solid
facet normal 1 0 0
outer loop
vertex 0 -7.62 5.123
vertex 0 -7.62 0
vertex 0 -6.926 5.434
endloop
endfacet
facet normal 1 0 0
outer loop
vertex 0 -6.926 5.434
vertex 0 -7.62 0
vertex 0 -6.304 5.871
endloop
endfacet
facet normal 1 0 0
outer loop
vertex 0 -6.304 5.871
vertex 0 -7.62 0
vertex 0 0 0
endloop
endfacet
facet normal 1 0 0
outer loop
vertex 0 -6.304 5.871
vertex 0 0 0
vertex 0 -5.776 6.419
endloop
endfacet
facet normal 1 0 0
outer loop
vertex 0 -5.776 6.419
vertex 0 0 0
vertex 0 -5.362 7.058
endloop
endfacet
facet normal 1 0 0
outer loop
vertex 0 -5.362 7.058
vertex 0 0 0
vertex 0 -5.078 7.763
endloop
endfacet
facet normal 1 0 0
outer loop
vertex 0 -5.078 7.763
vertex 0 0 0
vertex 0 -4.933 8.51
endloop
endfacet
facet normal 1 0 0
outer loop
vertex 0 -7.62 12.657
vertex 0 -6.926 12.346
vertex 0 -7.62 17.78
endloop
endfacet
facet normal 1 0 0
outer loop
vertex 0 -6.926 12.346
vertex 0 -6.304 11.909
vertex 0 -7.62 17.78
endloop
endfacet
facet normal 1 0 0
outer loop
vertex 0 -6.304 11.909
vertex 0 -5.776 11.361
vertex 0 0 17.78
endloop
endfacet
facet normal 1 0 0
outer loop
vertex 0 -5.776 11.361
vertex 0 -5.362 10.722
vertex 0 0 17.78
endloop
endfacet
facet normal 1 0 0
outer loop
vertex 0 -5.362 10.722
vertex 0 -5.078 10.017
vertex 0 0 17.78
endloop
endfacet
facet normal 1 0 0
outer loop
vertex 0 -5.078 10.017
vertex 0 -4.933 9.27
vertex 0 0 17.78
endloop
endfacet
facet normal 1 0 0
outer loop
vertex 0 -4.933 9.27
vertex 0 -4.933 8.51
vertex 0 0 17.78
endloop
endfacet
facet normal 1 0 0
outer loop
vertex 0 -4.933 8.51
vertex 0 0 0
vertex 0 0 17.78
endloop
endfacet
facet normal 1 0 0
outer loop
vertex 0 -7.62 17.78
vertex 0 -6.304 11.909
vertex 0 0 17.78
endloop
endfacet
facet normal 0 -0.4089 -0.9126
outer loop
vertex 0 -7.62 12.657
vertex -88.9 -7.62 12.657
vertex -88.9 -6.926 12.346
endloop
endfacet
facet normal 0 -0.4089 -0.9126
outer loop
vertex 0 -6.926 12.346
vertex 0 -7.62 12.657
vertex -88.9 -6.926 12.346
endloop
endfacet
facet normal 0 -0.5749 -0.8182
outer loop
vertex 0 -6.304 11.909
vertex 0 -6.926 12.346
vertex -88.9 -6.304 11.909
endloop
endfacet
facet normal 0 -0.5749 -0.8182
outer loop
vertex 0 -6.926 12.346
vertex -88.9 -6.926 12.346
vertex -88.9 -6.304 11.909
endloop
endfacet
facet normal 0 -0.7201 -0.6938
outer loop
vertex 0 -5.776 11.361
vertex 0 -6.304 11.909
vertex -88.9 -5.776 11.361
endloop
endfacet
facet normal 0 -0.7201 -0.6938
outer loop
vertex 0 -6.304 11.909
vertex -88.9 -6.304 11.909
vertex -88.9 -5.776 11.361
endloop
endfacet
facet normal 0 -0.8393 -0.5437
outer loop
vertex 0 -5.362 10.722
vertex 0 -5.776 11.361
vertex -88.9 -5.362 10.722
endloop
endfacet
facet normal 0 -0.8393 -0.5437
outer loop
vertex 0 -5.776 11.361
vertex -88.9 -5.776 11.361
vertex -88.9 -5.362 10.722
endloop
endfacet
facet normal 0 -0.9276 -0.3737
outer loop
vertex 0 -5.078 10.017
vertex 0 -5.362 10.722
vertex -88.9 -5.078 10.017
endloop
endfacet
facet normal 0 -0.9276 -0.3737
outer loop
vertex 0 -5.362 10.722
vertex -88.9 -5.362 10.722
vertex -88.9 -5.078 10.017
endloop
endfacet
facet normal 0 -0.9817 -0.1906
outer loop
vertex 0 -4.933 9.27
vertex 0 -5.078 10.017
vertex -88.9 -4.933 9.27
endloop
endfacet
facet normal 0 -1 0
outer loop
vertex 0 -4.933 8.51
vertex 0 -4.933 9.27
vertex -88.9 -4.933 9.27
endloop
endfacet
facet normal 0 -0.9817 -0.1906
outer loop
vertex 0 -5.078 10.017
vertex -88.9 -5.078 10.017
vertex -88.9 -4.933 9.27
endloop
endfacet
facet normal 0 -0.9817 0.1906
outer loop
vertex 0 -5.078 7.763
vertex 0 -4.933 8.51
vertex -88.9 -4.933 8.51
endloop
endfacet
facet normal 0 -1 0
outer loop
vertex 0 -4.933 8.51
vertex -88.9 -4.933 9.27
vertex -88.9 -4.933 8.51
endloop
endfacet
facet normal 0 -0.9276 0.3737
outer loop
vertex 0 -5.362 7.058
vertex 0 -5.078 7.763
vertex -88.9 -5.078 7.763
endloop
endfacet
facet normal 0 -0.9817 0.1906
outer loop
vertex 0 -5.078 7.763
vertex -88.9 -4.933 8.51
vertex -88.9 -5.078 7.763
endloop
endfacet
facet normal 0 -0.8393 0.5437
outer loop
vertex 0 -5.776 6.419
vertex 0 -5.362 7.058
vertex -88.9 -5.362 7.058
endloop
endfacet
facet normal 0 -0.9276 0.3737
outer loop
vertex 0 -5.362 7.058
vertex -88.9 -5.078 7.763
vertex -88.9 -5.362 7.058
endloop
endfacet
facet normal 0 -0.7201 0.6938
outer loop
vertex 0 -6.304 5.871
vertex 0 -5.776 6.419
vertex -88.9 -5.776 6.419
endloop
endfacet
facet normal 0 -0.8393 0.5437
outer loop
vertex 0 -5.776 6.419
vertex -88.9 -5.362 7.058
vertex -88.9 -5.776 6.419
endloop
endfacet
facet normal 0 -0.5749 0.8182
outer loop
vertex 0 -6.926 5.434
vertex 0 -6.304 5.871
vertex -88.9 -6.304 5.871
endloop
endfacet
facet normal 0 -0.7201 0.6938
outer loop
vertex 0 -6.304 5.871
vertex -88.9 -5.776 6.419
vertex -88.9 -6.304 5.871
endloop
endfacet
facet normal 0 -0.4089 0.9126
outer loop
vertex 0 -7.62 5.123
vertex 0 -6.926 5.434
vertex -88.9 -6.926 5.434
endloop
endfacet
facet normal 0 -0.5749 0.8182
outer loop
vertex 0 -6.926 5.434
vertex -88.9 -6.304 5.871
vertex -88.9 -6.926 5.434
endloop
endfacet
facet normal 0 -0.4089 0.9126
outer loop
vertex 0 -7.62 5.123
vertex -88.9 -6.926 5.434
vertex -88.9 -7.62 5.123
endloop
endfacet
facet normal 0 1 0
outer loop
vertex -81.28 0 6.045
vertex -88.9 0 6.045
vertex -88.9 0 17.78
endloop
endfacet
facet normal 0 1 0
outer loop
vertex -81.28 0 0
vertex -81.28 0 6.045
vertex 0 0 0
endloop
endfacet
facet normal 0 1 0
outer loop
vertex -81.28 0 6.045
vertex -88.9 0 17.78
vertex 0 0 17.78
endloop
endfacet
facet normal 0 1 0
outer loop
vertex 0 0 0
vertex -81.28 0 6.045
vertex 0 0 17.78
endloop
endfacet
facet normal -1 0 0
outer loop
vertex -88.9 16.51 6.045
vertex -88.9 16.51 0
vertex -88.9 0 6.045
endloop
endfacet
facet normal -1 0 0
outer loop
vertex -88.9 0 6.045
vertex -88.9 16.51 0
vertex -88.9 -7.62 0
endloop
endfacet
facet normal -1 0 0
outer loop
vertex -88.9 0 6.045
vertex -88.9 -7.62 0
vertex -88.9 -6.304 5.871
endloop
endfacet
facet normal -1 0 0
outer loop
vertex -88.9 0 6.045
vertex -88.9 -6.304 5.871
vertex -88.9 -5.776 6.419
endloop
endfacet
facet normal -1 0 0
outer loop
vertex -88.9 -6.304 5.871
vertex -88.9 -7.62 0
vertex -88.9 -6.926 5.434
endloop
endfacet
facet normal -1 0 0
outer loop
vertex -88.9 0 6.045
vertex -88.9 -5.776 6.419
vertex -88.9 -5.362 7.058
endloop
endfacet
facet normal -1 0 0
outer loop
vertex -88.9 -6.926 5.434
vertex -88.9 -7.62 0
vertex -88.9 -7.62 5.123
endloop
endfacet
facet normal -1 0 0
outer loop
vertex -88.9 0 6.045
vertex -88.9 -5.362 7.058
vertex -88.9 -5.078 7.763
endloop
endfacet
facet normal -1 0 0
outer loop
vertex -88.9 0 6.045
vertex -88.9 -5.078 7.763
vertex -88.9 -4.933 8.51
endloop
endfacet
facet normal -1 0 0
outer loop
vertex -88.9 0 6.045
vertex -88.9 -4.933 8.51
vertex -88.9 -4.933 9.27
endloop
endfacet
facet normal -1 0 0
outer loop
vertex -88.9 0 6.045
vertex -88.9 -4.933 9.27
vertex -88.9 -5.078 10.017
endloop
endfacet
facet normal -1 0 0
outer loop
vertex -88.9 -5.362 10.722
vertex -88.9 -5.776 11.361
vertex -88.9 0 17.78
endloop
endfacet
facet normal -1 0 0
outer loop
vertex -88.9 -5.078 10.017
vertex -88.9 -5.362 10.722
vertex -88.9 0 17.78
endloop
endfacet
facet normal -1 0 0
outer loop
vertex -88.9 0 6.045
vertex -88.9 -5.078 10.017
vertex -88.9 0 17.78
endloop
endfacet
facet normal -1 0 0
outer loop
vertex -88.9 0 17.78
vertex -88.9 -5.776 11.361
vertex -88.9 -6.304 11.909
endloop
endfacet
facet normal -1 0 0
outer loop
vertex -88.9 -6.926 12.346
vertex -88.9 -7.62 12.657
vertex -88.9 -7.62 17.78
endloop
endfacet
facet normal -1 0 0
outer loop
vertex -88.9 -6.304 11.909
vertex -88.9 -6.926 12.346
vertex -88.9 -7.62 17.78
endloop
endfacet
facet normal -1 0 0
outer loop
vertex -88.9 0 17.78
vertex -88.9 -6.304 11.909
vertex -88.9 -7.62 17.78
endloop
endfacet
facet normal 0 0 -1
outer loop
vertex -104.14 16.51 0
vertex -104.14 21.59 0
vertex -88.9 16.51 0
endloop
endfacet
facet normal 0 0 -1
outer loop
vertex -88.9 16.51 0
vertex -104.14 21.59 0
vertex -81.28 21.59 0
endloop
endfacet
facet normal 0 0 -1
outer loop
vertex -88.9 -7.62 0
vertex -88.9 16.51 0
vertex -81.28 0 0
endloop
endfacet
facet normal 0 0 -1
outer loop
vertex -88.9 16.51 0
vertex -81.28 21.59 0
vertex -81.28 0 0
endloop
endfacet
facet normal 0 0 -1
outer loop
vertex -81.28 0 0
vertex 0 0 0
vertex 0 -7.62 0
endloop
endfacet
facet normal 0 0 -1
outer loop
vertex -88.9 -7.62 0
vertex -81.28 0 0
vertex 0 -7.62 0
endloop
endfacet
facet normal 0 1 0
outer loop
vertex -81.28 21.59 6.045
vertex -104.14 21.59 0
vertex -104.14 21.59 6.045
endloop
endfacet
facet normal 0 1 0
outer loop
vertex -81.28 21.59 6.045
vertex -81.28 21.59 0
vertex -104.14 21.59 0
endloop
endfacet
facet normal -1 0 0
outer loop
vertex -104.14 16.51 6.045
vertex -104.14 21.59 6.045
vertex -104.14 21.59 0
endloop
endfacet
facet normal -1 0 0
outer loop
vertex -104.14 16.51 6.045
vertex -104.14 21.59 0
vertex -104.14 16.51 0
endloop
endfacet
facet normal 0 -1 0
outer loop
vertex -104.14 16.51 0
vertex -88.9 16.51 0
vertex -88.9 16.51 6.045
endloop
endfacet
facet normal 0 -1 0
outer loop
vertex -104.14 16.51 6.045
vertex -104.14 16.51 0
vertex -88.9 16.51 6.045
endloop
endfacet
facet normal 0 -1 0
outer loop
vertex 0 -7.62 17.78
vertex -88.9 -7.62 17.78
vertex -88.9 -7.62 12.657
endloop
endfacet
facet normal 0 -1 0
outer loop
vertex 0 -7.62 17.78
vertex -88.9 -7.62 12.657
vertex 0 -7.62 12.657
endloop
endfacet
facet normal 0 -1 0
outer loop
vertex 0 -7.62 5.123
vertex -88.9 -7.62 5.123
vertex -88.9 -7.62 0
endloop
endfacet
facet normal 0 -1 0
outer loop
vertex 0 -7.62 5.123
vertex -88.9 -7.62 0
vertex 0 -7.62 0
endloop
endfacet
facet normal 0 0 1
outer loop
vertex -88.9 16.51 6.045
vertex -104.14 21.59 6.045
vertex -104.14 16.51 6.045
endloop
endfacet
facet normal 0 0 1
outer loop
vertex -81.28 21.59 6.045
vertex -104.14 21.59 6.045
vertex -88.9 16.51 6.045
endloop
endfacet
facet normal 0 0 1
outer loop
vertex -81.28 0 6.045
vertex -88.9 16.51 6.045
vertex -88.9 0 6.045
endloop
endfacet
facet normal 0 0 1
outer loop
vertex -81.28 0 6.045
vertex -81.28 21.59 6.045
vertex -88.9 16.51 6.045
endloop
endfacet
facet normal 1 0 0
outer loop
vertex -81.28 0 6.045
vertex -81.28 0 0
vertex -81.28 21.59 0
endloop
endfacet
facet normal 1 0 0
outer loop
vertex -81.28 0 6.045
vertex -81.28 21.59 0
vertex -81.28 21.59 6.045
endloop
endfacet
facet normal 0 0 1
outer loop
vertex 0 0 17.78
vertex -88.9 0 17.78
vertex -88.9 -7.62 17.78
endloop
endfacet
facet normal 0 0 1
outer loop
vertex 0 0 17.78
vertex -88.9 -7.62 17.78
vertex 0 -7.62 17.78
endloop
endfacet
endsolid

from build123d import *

# Parameters (mm, degrees)
F0_W     = 88.9
F0_H     = 17.78
F1_DEPTH = 7.62
F2_R     = 3.9751
F3_DEPTH = 88.901
F4_W     = 7.62
F4_H     = 6.0452
F5_DEPTH = 21.59
F6_W     = 5.08
F6_H     = 6.0452
F7_DEPTH = 15.24


with BuildPart() as f1:
    # F0 (on Front) → F1 (new body)
    with BuildSketch(Plane.XZ):
        with Locations((-44.45, 8.89)):
            Rectangle(F0_W, F0_H)
    extrude(amount=F1_DEPTH)

    # F2 (on face) → F3 (cut, through all)
    with BuildSketch(Plane(origin=(-88.9, 0, 0), x_dir=(0, -1, 0), z_dir=(-1, 0, 0))):
        with Locations((8.89, 8.89)):
            Circle(F2_R)
    extrude(amount=-F3_DEPTH, mode=Mode.SUBTRACT)

    # F4 (on face) → F5 (join)
    with BuildSketch(Plane(origin=(0, 0, 0), x_dir=(-1, 0, 0), z_dir=(0, 1, 0))):
        with Locations((85.09, 3.0226)):
            Rectangle(F4_W, F4_H)
    extrude(amount=F5_DEPTH)

    # F6 (on face) → F7 (join)
    with BuildSketch(Plane(origin=(-88.9, 0, 0), x_dir=(0, -1, 0), z_dir=(-1, 0, 0))):
        with Locations((-19.05, 3.0226)):
            Rectangle(F6_W, F6_H)
    extrude(amount=F7_DEPTH)


solid = f1.part
